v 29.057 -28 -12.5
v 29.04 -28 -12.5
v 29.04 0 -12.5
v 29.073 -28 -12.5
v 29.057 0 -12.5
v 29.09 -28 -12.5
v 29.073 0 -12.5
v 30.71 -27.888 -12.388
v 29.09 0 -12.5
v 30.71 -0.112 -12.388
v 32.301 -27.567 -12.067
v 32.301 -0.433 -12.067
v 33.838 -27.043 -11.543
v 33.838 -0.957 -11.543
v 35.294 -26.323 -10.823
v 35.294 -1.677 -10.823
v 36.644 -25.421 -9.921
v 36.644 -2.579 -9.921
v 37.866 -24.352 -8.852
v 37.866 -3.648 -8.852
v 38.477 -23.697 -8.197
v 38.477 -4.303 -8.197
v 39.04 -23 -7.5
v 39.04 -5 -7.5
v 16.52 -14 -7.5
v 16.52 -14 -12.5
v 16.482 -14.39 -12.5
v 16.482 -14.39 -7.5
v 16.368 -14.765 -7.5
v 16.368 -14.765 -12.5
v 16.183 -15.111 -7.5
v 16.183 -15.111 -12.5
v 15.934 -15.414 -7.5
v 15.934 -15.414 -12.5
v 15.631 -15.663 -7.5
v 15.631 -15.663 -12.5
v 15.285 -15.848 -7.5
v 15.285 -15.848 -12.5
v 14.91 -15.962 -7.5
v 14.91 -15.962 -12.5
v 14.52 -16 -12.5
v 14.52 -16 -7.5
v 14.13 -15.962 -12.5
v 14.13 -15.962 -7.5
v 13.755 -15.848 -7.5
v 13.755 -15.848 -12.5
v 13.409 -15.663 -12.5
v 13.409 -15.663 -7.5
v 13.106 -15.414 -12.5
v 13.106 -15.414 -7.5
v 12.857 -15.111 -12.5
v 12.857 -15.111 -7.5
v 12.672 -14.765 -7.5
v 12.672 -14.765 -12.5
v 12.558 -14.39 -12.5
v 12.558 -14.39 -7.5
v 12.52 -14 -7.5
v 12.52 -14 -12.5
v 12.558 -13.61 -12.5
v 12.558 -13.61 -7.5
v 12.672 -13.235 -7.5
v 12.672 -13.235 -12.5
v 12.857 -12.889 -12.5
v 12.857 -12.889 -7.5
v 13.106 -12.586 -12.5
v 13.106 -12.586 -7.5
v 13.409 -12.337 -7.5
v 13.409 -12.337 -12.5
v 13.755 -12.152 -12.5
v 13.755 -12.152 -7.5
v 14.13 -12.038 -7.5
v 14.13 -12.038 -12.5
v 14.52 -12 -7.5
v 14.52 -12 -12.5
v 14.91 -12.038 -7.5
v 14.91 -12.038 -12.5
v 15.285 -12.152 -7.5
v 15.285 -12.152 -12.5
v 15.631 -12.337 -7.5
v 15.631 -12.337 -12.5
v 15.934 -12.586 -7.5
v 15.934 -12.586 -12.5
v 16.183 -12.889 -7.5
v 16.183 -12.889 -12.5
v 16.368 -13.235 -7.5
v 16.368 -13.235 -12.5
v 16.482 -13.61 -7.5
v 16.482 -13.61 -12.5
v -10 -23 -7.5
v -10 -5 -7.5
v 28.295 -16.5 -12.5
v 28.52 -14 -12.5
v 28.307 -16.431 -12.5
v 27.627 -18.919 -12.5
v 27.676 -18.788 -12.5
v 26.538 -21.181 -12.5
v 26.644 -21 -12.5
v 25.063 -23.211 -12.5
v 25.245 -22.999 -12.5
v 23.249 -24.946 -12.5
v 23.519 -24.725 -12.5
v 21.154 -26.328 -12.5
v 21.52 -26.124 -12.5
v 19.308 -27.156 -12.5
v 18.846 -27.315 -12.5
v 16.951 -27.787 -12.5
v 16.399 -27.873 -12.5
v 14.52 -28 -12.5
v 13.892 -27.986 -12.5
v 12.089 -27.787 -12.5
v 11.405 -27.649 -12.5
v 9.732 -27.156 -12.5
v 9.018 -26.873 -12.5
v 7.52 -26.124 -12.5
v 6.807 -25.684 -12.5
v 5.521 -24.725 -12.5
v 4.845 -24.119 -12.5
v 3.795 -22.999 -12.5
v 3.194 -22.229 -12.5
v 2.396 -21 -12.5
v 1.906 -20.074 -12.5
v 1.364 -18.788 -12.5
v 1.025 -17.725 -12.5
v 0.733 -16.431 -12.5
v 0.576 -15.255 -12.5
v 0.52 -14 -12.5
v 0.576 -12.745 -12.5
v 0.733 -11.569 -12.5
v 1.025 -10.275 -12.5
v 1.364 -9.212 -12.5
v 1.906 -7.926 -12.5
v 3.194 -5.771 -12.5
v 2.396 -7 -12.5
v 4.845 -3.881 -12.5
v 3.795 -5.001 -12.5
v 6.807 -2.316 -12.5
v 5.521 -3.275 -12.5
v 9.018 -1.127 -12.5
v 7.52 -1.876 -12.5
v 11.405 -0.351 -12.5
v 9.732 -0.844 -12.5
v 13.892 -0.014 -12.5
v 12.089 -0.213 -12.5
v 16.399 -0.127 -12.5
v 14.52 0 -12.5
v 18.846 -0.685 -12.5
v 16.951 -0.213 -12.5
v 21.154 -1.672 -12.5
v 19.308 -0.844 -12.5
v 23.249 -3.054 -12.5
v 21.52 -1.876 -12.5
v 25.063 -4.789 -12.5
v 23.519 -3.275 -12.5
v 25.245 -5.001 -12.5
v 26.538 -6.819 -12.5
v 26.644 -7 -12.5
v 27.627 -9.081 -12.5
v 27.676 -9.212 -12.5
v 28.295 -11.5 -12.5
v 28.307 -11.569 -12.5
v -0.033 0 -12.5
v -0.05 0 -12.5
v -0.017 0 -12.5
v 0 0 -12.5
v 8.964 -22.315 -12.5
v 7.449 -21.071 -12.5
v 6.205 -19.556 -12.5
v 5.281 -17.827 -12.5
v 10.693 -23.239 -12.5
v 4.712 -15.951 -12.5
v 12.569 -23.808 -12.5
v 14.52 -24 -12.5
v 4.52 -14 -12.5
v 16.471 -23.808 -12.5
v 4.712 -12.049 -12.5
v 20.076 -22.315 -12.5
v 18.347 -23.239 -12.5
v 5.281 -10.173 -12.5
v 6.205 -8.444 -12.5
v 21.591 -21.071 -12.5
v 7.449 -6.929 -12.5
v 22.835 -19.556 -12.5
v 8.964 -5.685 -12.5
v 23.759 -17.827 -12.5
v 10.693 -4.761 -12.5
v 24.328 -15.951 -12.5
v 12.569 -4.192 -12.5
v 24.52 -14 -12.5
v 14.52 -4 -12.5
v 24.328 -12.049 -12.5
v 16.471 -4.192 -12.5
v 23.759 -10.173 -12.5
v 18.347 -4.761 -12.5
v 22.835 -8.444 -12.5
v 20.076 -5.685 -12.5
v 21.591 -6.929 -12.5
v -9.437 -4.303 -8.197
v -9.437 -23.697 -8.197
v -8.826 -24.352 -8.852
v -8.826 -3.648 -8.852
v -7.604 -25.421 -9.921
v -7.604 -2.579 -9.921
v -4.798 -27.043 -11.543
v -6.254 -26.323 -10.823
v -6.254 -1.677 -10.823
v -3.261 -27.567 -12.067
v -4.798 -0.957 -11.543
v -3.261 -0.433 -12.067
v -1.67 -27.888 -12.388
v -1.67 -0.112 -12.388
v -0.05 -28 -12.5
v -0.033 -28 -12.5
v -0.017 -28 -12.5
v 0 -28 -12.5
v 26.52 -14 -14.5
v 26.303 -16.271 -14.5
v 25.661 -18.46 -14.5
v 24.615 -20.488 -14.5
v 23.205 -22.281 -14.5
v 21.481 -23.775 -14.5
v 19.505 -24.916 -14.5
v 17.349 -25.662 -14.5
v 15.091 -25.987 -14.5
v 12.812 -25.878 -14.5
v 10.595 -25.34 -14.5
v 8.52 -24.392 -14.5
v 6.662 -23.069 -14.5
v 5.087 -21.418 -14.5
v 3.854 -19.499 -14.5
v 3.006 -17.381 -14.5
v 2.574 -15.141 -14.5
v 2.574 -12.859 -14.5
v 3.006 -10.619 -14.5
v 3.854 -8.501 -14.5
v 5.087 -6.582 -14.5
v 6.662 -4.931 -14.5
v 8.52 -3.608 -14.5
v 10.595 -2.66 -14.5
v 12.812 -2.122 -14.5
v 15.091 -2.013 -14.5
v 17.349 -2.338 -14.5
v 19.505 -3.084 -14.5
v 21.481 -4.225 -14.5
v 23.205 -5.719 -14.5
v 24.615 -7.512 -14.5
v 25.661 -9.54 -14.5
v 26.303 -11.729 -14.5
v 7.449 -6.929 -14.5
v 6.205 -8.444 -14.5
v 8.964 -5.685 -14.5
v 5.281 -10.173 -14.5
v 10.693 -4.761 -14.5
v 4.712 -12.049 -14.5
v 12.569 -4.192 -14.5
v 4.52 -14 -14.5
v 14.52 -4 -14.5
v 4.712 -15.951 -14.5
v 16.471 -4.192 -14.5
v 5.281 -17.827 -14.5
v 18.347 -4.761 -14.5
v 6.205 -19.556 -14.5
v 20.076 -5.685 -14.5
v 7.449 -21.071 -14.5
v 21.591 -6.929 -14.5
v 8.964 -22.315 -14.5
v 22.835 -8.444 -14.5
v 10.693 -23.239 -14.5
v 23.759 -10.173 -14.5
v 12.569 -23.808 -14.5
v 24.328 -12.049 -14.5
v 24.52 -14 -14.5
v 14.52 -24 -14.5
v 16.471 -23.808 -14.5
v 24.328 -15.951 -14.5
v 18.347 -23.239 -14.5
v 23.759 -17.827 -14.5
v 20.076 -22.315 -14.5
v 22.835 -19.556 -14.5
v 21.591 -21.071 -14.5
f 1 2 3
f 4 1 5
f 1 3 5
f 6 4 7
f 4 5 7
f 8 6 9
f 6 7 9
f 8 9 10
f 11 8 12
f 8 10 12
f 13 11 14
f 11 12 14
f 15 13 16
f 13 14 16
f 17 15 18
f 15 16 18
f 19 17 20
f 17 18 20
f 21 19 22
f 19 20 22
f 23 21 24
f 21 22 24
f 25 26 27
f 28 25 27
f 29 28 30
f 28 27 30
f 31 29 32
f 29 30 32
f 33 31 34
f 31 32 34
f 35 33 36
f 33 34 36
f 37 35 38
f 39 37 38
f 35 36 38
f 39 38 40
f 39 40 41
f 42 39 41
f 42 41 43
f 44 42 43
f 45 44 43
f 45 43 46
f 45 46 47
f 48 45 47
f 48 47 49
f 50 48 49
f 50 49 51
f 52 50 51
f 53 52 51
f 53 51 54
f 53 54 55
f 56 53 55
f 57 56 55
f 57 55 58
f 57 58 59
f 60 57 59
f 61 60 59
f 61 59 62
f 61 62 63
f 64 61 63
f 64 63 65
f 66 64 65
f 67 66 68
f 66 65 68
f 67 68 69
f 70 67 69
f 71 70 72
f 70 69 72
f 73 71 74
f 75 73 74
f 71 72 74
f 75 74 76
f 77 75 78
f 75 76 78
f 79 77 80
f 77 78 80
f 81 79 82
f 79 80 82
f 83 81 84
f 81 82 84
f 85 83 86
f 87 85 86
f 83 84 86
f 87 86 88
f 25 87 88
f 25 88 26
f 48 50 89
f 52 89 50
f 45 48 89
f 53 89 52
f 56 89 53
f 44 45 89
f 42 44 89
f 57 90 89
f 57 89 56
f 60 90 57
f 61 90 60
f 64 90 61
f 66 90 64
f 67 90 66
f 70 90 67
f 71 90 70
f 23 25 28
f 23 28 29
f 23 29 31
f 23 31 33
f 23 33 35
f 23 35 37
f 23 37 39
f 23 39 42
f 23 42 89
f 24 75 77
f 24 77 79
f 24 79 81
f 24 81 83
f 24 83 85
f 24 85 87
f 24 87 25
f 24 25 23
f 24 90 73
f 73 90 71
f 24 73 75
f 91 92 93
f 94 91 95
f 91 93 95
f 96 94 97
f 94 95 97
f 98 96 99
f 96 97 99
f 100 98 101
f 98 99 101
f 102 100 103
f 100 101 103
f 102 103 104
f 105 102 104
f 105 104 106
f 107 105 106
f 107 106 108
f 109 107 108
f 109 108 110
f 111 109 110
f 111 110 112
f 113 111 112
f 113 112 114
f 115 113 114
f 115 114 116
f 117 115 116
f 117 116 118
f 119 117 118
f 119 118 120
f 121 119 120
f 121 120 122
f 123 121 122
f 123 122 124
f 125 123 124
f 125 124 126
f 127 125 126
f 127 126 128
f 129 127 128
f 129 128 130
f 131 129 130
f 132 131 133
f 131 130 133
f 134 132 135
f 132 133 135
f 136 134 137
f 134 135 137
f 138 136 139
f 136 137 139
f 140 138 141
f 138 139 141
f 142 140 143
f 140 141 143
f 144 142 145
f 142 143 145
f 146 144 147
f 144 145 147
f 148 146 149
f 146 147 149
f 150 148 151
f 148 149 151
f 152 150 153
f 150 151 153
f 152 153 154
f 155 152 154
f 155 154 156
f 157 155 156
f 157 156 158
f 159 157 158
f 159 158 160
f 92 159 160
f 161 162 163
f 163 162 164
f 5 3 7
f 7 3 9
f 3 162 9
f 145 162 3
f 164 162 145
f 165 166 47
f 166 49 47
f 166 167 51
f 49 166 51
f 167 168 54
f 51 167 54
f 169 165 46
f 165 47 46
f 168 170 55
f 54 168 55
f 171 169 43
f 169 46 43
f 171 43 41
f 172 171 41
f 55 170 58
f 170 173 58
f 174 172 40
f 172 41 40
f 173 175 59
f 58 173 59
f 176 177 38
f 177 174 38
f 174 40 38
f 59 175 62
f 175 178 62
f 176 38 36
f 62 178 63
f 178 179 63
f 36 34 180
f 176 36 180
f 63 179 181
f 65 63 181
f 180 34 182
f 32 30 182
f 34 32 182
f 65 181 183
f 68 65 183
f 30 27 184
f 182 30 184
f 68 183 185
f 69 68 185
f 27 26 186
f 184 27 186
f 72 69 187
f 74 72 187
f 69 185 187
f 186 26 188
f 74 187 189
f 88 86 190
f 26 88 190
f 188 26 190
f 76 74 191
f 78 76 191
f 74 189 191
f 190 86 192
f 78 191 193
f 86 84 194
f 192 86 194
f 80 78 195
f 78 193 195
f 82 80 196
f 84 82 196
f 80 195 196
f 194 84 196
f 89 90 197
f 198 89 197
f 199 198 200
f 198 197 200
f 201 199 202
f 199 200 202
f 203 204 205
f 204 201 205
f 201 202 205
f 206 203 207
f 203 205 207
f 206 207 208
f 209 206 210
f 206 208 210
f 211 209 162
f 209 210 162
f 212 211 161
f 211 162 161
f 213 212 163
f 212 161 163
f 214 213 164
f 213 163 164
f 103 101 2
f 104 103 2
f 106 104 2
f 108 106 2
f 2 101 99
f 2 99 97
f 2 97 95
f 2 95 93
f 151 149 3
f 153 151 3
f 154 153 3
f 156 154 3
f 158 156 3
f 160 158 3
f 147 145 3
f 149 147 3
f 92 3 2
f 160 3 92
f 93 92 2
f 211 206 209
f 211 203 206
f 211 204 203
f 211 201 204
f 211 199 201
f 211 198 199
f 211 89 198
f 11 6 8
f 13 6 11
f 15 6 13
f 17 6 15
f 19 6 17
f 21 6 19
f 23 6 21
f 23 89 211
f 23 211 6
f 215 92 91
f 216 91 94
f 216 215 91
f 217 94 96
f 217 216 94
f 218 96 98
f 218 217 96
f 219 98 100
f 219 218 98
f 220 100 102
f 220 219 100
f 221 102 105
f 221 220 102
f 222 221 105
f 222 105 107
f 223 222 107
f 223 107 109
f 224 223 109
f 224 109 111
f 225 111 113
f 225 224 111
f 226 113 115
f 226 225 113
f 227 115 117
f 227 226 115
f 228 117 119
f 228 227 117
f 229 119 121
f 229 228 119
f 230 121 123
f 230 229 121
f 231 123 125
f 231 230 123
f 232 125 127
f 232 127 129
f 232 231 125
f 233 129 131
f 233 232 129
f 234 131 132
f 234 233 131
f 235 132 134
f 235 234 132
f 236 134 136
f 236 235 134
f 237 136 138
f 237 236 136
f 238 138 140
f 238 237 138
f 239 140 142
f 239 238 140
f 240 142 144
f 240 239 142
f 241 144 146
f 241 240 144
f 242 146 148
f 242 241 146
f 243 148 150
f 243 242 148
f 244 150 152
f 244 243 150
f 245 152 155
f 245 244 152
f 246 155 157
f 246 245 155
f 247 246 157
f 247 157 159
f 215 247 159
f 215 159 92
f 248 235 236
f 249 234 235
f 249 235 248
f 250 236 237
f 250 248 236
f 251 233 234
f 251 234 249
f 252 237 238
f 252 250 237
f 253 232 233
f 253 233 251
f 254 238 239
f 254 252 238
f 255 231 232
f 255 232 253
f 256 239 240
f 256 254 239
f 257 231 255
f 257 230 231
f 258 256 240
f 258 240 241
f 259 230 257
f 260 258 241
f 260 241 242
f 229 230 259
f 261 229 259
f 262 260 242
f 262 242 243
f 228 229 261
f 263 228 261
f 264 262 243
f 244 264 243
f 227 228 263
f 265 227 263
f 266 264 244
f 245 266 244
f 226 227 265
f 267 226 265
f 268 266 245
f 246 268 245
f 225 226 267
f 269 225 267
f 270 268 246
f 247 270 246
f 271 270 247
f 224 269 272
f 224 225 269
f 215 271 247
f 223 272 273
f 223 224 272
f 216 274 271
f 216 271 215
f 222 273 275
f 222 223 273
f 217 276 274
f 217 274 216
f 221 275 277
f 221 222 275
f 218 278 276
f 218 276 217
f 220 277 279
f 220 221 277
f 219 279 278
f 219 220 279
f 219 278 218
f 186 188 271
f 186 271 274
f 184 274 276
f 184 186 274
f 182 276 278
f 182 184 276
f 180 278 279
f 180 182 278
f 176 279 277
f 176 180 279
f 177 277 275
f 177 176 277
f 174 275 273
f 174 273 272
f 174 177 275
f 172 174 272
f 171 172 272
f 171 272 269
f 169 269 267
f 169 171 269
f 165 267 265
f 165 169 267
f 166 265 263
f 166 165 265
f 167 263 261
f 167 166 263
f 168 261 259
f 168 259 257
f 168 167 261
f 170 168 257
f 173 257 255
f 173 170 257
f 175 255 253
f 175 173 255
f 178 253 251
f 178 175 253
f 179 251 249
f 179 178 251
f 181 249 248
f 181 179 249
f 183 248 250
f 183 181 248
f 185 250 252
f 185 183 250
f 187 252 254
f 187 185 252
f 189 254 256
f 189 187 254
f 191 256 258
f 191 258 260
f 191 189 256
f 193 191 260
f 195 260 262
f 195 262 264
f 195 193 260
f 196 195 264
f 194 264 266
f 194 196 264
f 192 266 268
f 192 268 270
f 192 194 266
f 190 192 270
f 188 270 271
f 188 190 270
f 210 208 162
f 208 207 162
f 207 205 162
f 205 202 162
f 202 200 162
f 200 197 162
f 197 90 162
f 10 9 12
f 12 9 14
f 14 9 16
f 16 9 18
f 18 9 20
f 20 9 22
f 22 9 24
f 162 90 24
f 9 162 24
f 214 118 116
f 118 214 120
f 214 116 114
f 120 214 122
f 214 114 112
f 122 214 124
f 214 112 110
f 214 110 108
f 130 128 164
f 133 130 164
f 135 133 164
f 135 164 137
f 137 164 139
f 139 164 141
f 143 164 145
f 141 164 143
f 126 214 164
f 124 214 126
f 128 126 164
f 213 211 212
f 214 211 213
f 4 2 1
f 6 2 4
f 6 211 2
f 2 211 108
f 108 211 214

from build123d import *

# Parameters (mm, degrees)
PAD_DEPTH       = 28
SKETCH001_R     = 14
SKETCH001_R_2   = 10
PAD001_DEPTH    = 2
CHAMFER_SIZE    = 1.9999
CHAMFER001_SIZE = 4.9999
SKETCH002_R     = 2
POCKET_DEPTH    = 10


with BuildPart() as part:
    # Sketch → Pad (new body)
    with BuildSketch(Plane.XZ):
        with BuildLine():
            ThreePointArc((-10, -7.5), (-5.59017, -11.18034), (0, -12.5))
            Line((0, -12.5), (29.04, -12.5))
            ThreePointArc((29.04, -12.5), (34.63017, -11.18034), (39.04, -7.5))
            Line((-10, -7.5), (39.04, -7.5))
        make_face()
    extrude(amount=PAD_DEPTH)

    # Sketch001 (on Face2 of Pad) → Pad001 (join)
    with BuildSketch(Plane(origin=(0, 0, -12.5), x_dir=(1, 0, 0), z_dir=(0, 0, -1))):
        with Locations((14.52, 14)):
            Circle(SKETCH001_R)
        with Locations((14.52, 14)):
            Circle(SKETCH001_R_2, mode=Mode.SUBTRACT)
    extrude(amount=PAD001_DEPTH)

    # Chamfer
    chamfer_edges = [part.edges().sort_by_distance(p)[0] for p in [
        (0.52, -14, -14.5),
    ]]
    chamfer(chamfer_edges, length=CHAMFER_SIZE)

    # Chamfer001
    chamfer001_edges = [part.edges().sort_by_distance(p)[0] for p in [
        (14.52, 0, -7.5),
        (14.52, -28, -7.5),
    ]]
    chamfer(chamfer001_edges, length=CHAMFER001_SIZE)

    # Sketch002 (on Face14 of Chamfer001) → Pocket (cut)
    with BuildSketch(Plane(origin=(0, 0, -12.5), x_dir=(1, 0, 0), z_dir=(0, 0, -1))):
        with Locations((14.52, 14)):
            Circle(SKETCH002_R)
    extrude(amount=-POCKET_DEPTH, mode=Mode.SUBTRACT)


solid = part.part
